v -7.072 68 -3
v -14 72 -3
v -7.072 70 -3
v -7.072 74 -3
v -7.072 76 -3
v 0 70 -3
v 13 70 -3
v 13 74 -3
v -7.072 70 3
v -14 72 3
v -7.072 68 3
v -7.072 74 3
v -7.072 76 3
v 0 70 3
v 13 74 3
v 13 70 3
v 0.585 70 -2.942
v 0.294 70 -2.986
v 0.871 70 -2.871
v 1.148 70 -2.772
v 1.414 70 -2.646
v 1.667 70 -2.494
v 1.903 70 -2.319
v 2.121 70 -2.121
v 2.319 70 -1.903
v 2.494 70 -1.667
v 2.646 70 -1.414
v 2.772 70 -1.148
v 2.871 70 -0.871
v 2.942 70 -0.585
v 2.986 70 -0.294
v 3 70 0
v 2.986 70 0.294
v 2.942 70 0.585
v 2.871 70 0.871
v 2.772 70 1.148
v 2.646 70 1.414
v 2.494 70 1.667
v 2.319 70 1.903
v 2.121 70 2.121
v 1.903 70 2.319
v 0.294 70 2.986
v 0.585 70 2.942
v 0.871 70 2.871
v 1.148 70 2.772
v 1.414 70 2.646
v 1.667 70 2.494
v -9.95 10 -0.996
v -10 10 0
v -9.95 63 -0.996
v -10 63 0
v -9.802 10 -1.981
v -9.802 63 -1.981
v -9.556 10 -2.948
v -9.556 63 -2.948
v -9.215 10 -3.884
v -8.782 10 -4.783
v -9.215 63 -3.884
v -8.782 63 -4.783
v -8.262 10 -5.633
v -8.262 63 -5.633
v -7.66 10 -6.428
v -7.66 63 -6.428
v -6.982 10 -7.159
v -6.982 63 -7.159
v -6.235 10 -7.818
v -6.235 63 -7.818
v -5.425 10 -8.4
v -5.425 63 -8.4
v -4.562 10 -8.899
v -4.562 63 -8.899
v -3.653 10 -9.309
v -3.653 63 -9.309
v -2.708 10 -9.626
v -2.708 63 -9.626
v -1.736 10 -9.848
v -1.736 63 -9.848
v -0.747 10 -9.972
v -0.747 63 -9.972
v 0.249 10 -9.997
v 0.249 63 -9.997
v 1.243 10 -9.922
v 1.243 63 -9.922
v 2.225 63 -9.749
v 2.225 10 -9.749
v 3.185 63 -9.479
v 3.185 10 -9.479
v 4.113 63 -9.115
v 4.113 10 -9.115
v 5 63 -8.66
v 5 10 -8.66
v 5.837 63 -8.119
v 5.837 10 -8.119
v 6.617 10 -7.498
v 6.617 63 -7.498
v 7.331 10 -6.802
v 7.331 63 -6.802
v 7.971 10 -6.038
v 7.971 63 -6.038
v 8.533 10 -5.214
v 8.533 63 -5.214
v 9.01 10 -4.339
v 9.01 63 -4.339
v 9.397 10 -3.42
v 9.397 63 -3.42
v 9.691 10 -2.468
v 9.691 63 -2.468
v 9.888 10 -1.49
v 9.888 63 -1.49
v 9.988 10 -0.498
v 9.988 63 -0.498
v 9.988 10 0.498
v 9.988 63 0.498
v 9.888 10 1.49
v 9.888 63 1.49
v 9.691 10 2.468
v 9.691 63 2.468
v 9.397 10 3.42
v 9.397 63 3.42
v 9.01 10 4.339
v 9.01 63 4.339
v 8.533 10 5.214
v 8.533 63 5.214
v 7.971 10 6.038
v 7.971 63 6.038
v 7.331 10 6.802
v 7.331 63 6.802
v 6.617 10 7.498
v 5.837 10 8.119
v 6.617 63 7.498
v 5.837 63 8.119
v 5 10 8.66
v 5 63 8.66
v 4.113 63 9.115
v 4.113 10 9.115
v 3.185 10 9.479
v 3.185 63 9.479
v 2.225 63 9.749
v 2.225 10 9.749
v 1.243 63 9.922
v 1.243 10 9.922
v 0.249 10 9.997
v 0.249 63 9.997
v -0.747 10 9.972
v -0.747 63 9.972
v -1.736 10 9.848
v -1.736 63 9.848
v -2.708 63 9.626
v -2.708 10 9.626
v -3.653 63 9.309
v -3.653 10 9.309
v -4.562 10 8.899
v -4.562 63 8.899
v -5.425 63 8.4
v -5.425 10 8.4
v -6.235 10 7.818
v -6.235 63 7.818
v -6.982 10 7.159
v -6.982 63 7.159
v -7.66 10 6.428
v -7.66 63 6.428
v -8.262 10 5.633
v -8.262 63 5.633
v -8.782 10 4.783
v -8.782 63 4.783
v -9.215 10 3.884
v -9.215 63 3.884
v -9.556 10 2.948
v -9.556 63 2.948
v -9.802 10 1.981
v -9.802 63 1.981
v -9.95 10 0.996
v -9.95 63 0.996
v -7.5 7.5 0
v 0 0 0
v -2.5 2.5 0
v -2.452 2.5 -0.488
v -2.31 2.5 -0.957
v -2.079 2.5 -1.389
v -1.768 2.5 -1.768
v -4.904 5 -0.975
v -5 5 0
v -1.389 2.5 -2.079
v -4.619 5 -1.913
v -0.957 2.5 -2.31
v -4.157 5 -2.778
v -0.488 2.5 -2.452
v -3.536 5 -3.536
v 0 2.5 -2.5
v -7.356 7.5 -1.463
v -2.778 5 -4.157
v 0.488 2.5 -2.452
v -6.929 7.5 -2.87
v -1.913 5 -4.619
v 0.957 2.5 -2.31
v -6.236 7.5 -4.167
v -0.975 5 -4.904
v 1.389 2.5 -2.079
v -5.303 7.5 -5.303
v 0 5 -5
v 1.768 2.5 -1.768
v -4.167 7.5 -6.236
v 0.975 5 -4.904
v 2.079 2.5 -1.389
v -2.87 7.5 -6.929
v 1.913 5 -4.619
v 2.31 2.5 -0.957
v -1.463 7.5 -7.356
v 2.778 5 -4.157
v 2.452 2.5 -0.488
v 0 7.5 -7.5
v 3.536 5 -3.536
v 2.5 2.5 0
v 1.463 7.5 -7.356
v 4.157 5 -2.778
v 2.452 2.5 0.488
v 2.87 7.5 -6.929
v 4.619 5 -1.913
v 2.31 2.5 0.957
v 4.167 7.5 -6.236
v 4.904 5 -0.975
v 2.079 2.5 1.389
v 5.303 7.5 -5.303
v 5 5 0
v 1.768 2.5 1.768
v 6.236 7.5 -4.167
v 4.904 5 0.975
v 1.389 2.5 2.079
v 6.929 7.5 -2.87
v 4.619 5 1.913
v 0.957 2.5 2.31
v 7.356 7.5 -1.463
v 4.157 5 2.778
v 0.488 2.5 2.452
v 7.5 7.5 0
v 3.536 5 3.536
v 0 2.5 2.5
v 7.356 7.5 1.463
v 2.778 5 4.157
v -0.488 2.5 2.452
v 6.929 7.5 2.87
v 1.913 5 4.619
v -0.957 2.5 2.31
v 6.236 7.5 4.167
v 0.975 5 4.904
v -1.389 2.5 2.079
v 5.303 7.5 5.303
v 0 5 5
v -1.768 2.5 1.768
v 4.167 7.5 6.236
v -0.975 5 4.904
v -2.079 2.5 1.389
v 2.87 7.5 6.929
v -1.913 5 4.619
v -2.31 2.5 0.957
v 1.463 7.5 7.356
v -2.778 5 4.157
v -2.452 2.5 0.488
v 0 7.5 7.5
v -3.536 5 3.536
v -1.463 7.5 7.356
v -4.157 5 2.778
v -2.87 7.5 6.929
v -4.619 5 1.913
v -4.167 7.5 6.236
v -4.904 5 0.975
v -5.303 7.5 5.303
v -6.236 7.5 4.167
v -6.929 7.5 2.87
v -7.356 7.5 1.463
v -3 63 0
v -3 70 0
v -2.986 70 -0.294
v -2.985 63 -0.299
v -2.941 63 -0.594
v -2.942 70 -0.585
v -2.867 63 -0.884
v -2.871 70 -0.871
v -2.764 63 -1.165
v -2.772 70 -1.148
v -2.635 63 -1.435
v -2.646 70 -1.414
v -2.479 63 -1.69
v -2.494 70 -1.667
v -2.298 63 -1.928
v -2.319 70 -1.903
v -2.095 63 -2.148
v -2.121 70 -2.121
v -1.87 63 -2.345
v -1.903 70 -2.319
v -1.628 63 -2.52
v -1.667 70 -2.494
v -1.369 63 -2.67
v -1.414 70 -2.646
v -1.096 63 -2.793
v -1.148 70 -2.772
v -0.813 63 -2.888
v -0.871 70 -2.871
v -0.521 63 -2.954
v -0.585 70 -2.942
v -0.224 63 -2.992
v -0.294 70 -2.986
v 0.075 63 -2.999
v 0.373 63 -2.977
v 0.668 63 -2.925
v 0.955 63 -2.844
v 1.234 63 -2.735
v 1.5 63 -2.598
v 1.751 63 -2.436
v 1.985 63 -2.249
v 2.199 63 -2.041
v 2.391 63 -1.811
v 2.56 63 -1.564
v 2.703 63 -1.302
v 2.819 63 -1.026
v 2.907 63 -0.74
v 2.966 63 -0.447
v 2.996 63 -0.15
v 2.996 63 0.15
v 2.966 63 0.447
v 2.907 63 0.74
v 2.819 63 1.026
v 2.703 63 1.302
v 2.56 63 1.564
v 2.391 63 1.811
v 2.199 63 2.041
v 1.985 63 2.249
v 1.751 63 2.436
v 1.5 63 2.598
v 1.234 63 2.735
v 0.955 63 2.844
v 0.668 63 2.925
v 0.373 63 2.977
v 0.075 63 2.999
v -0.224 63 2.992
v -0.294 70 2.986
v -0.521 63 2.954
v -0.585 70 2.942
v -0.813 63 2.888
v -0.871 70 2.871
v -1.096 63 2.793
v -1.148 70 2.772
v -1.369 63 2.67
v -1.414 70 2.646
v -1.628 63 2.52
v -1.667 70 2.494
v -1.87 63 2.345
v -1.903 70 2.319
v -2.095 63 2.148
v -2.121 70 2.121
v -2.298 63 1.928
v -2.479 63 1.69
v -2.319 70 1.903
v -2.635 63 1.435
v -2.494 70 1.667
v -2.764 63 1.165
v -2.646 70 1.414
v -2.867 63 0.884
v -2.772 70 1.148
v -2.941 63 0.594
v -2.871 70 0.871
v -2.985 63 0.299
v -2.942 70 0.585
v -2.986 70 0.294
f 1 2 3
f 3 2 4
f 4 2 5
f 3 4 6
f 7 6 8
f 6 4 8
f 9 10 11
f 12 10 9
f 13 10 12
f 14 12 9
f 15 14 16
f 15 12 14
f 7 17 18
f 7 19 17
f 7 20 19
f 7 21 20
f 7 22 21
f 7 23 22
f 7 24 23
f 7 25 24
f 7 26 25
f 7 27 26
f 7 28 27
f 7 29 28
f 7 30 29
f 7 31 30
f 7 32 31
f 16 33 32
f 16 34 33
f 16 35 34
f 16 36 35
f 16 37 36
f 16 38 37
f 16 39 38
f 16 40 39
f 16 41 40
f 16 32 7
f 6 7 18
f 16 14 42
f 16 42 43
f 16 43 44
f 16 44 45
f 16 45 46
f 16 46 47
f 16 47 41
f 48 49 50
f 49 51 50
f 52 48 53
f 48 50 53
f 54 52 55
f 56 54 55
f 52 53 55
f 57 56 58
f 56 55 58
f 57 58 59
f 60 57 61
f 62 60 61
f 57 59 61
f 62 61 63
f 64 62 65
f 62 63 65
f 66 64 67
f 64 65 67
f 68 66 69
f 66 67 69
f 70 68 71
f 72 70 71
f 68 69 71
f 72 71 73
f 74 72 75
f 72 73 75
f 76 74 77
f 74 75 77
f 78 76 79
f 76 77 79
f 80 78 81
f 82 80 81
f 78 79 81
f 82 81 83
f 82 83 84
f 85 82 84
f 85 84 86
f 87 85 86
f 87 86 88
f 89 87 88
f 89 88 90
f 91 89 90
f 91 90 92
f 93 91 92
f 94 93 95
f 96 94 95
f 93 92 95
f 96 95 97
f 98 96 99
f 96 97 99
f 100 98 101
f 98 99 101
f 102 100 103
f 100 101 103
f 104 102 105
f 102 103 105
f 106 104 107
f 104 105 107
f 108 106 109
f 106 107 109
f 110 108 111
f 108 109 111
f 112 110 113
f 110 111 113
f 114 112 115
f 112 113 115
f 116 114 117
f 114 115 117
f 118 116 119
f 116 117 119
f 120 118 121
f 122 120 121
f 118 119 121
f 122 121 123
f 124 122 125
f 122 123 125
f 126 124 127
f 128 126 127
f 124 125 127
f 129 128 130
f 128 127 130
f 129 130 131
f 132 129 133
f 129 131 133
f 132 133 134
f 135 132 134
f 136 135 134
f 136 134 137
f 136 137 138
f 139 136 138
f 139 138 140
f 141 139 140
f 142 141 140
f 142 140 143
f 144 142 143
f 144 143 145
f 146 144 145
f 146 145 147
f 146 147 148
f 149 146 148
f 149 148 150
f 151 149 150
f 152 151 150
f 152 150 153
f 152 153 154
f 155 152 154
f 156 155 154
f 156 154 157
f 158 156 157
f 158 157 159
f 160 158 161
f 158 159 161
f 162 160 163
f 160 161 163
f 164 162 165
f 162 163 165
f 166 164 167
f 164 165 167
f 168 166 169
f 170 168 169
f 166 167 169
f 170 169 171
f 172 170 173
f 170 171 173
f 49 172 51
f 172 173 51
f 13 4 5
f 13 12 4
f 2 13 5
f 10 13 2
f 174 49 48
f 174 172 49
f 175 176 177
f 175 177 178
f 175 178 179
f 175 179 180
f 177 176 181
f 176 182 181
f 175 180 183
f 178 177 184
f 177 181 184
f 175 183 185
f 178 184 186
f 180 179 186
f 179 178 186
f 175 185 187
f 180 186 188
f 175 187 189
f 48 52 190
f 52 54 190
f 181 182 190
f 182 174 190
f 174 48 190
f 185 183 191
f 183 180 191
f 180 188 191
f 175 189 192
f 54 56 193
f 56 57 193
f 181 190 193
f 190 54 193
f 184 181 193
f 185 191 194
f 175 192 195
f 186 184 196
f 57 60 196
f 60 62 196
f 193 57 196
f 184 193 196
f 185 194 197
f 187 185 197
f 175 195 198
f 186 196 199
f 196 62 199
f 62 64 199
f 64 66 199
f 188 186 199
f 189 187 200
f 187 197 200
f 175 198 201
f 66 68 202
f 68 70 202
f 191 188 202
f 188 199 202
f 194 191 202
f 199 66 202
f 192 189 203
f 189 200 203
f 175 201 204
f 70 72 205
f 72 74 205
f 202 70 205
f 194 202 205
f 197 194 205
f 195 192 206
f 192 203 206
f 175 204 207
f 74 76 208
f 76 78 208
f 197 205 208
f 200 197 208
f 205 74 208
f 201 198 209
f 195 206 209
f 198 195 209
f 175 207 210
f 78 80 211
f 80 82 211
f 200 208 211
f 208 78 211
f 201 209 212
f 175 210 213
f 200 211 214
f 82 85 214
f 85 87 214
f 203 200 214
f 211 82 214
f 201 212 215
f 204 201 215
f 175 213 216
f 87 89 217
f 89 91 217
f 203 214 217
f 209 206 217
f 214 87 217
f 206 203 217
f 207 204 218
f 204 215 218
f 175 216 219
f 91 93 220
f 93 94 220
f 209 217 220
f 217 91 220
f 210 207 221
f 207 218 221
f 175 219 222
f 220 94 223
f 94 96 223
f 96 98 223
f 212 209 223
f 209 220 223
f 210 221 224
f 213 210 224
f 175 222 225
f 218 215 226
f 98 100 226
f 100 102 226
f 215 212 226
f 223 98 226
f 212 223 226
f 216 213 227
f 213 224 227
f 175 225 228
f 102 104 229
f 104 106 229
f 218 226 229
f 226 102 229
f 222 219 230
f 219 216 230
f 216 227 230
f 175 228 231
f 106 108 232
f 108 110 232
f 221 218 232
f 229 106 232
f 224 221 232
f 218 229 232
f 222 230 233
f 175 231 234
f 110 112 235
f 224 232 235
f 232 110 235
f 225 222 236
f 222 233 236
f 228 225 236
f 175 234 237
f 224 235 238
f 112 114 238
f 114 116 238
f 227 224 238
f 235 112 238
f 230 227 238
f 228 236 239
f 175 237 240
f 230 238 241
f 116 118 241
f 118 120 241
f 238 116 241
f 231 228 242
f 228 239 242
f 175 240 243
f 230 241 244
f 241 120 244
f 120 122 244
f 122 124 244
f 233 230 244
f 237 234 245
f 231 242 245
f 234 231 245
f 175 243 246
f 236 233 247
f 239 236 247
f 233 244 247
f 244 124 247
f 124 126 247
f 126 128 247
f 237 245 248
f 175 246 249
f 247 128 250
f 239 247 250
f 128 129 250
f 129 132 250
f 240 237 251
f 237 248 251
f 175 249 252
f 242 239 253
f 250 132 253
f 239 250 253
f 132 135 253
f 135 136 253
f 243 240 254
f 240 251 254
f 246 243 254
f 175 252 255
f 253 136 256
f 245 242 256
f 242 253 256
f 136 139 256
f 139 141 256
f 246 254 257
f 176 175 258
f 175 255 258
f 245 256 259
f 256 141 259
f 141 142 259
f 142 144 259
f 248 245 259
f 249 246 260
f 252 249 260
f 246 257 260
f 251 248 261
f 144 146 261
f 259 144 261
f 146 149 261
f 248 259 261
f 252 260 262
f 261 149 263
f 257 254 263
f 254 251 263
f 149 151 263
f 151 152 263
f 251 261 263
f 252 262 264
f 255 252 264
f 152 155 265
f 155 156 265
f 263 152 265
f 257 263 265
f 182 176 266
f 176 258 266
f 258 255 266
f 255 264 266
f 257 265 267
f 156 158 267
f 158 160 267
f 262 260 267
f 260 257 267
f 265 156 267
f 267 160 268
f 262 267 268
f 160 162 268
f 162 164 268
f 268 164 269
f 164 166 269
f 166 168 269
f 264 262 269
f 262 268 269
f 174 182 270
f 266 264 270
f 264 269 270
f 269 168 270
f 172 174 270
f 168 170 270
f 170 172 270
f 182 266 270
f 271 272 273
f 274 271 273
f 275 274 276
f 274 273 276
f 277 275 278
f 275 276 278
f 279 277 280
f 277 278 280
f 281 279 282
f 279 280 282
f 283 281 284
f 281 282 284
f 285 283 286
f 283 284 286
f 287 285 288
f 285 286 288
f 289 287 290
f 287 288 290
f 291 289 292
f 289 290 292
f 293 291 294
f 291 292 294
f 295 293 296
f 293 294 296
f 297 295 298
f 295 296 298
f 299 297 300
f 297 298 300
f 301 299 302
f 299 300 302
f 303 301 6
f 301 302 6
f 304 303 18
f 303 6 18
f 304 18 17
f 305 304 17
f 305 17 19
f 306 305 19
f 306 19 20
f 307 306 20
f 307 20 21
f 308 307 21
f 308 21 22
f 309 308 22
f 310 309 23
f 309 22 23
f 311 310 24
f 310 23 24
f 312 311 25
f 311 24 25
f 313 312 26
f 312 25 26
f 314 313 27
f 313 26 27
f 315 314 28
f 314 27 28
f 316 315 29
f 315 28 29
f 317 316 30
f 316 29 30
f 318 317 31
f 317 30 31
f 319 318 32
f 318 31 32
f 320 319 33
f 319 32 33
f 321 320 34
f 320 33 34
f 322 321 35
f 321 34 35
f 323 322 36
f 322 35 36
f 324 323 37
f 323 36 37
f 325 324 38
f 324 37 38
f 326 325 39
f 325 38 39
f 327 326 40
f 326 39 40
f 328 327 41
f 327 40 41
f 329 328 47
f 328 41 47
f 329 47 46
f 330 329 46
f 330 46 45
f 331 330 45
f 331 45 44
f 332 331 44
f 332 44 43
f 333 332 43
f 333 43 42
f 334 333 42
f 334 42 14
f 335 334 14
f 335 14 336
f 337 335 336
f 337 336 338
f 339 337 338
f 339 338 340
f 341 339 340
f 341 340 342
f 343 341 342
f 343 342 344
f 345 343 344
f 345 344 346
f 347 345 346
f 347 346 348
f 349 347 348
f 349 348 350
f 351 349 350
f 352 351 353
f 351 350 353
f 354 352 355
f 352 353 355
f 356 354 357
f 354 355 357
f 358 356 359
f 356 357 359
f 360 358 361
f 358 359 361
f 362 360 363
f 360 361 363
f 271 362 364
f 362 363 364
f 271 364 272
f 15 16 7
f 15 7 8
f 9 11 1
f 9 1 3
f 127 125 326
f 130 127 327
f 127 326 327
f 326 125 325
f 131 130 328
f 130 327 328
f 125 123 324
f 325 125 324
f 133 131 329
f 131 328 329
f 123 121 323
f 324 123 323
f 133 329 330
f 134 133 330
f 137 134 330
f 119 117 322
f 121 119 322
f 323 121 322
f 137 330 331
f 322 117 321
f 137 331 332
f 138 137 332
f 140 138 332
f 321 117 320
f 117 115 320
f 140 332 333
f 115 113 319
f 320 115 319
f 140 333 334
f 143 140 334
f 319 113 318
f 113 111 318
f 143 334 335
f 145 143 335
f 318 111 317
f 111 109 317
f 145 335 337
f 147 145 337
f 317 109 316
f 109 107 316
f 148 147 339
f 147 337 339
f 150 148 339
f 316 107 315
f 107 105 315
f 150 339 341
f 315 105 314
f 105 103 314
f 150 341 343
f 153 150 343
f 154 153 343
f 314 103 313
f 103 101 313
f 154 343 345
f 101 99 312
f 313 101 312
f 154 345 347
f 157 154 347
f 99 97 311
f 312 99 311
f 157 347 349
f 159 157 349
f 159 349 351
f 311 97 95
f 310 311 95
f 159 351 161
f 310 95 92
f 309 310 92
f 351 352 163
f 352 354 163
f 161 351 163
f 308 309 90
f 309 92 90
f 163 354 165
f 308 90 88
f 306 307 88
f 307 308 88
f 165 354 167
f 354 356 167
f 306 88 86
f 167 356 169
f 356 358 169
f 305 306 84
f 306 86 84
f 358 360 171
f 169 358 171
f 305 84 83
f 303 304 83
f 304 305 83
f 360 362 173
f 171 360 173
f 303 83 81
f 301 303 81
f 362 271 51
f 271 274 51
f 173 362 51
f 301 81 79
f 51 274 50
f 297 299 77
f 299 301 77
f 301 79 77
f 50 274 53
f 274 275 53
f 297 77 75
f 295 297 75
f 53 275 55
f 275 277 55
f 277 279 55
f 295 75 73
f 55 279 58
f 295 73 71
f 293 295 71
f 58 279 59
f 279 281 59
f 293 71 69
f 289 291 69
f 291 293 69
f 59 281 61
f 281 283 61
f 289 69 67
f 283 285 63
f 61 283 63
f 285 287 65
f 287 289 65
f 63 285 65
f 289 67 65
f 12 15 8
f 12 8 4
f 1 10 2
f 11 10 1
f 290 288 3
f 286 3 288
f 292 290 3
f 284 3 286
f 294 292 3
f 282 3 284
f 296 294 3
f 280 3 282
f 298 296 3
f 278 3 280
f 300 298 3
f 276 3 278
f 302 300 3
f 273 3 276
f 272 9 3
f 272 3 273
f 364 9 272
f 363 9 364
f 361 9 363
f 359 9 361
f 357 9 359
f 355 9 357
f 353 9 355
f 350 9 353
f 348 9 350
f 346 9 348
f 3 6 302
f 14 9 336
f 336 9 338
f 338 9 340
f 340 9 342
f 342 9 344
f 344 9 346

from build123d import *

# Parameters (mm, degrees)
EXTRUDE_1_DEPTH = 3


with BuildPart() as part:
    # 草图1 → 旋转1 (revolve)
    with BuildSketch(Plane.XY, mode=Mode.PRIVATE) as revolve_1_sk:
        Polygon((0, 70), (0, 0), (10, 10), (10, 63), (3, 63), (3, 70), align=None)
    revolve(revolve_1_sk.sketch.rotate(Axis((0, 70, 0), (0, -1, 0)), 180), axis=Axis((0, 70, 0), (0, -1, 0)))

    # 草图2 → 凸台-拉伸1 (add, symmetric)
    with BuildSketch(Plane.XY):
        Polygon((-14, 72), (-7.07179677, 68), (-7.07179677, 70), (13, 70), (13, 74), (-7.07179677, 74), (-7.07179677, 76), align=None)
    extrude(amount=EXTRUDE_1_DEPTH, both=True)


solid = part.part
